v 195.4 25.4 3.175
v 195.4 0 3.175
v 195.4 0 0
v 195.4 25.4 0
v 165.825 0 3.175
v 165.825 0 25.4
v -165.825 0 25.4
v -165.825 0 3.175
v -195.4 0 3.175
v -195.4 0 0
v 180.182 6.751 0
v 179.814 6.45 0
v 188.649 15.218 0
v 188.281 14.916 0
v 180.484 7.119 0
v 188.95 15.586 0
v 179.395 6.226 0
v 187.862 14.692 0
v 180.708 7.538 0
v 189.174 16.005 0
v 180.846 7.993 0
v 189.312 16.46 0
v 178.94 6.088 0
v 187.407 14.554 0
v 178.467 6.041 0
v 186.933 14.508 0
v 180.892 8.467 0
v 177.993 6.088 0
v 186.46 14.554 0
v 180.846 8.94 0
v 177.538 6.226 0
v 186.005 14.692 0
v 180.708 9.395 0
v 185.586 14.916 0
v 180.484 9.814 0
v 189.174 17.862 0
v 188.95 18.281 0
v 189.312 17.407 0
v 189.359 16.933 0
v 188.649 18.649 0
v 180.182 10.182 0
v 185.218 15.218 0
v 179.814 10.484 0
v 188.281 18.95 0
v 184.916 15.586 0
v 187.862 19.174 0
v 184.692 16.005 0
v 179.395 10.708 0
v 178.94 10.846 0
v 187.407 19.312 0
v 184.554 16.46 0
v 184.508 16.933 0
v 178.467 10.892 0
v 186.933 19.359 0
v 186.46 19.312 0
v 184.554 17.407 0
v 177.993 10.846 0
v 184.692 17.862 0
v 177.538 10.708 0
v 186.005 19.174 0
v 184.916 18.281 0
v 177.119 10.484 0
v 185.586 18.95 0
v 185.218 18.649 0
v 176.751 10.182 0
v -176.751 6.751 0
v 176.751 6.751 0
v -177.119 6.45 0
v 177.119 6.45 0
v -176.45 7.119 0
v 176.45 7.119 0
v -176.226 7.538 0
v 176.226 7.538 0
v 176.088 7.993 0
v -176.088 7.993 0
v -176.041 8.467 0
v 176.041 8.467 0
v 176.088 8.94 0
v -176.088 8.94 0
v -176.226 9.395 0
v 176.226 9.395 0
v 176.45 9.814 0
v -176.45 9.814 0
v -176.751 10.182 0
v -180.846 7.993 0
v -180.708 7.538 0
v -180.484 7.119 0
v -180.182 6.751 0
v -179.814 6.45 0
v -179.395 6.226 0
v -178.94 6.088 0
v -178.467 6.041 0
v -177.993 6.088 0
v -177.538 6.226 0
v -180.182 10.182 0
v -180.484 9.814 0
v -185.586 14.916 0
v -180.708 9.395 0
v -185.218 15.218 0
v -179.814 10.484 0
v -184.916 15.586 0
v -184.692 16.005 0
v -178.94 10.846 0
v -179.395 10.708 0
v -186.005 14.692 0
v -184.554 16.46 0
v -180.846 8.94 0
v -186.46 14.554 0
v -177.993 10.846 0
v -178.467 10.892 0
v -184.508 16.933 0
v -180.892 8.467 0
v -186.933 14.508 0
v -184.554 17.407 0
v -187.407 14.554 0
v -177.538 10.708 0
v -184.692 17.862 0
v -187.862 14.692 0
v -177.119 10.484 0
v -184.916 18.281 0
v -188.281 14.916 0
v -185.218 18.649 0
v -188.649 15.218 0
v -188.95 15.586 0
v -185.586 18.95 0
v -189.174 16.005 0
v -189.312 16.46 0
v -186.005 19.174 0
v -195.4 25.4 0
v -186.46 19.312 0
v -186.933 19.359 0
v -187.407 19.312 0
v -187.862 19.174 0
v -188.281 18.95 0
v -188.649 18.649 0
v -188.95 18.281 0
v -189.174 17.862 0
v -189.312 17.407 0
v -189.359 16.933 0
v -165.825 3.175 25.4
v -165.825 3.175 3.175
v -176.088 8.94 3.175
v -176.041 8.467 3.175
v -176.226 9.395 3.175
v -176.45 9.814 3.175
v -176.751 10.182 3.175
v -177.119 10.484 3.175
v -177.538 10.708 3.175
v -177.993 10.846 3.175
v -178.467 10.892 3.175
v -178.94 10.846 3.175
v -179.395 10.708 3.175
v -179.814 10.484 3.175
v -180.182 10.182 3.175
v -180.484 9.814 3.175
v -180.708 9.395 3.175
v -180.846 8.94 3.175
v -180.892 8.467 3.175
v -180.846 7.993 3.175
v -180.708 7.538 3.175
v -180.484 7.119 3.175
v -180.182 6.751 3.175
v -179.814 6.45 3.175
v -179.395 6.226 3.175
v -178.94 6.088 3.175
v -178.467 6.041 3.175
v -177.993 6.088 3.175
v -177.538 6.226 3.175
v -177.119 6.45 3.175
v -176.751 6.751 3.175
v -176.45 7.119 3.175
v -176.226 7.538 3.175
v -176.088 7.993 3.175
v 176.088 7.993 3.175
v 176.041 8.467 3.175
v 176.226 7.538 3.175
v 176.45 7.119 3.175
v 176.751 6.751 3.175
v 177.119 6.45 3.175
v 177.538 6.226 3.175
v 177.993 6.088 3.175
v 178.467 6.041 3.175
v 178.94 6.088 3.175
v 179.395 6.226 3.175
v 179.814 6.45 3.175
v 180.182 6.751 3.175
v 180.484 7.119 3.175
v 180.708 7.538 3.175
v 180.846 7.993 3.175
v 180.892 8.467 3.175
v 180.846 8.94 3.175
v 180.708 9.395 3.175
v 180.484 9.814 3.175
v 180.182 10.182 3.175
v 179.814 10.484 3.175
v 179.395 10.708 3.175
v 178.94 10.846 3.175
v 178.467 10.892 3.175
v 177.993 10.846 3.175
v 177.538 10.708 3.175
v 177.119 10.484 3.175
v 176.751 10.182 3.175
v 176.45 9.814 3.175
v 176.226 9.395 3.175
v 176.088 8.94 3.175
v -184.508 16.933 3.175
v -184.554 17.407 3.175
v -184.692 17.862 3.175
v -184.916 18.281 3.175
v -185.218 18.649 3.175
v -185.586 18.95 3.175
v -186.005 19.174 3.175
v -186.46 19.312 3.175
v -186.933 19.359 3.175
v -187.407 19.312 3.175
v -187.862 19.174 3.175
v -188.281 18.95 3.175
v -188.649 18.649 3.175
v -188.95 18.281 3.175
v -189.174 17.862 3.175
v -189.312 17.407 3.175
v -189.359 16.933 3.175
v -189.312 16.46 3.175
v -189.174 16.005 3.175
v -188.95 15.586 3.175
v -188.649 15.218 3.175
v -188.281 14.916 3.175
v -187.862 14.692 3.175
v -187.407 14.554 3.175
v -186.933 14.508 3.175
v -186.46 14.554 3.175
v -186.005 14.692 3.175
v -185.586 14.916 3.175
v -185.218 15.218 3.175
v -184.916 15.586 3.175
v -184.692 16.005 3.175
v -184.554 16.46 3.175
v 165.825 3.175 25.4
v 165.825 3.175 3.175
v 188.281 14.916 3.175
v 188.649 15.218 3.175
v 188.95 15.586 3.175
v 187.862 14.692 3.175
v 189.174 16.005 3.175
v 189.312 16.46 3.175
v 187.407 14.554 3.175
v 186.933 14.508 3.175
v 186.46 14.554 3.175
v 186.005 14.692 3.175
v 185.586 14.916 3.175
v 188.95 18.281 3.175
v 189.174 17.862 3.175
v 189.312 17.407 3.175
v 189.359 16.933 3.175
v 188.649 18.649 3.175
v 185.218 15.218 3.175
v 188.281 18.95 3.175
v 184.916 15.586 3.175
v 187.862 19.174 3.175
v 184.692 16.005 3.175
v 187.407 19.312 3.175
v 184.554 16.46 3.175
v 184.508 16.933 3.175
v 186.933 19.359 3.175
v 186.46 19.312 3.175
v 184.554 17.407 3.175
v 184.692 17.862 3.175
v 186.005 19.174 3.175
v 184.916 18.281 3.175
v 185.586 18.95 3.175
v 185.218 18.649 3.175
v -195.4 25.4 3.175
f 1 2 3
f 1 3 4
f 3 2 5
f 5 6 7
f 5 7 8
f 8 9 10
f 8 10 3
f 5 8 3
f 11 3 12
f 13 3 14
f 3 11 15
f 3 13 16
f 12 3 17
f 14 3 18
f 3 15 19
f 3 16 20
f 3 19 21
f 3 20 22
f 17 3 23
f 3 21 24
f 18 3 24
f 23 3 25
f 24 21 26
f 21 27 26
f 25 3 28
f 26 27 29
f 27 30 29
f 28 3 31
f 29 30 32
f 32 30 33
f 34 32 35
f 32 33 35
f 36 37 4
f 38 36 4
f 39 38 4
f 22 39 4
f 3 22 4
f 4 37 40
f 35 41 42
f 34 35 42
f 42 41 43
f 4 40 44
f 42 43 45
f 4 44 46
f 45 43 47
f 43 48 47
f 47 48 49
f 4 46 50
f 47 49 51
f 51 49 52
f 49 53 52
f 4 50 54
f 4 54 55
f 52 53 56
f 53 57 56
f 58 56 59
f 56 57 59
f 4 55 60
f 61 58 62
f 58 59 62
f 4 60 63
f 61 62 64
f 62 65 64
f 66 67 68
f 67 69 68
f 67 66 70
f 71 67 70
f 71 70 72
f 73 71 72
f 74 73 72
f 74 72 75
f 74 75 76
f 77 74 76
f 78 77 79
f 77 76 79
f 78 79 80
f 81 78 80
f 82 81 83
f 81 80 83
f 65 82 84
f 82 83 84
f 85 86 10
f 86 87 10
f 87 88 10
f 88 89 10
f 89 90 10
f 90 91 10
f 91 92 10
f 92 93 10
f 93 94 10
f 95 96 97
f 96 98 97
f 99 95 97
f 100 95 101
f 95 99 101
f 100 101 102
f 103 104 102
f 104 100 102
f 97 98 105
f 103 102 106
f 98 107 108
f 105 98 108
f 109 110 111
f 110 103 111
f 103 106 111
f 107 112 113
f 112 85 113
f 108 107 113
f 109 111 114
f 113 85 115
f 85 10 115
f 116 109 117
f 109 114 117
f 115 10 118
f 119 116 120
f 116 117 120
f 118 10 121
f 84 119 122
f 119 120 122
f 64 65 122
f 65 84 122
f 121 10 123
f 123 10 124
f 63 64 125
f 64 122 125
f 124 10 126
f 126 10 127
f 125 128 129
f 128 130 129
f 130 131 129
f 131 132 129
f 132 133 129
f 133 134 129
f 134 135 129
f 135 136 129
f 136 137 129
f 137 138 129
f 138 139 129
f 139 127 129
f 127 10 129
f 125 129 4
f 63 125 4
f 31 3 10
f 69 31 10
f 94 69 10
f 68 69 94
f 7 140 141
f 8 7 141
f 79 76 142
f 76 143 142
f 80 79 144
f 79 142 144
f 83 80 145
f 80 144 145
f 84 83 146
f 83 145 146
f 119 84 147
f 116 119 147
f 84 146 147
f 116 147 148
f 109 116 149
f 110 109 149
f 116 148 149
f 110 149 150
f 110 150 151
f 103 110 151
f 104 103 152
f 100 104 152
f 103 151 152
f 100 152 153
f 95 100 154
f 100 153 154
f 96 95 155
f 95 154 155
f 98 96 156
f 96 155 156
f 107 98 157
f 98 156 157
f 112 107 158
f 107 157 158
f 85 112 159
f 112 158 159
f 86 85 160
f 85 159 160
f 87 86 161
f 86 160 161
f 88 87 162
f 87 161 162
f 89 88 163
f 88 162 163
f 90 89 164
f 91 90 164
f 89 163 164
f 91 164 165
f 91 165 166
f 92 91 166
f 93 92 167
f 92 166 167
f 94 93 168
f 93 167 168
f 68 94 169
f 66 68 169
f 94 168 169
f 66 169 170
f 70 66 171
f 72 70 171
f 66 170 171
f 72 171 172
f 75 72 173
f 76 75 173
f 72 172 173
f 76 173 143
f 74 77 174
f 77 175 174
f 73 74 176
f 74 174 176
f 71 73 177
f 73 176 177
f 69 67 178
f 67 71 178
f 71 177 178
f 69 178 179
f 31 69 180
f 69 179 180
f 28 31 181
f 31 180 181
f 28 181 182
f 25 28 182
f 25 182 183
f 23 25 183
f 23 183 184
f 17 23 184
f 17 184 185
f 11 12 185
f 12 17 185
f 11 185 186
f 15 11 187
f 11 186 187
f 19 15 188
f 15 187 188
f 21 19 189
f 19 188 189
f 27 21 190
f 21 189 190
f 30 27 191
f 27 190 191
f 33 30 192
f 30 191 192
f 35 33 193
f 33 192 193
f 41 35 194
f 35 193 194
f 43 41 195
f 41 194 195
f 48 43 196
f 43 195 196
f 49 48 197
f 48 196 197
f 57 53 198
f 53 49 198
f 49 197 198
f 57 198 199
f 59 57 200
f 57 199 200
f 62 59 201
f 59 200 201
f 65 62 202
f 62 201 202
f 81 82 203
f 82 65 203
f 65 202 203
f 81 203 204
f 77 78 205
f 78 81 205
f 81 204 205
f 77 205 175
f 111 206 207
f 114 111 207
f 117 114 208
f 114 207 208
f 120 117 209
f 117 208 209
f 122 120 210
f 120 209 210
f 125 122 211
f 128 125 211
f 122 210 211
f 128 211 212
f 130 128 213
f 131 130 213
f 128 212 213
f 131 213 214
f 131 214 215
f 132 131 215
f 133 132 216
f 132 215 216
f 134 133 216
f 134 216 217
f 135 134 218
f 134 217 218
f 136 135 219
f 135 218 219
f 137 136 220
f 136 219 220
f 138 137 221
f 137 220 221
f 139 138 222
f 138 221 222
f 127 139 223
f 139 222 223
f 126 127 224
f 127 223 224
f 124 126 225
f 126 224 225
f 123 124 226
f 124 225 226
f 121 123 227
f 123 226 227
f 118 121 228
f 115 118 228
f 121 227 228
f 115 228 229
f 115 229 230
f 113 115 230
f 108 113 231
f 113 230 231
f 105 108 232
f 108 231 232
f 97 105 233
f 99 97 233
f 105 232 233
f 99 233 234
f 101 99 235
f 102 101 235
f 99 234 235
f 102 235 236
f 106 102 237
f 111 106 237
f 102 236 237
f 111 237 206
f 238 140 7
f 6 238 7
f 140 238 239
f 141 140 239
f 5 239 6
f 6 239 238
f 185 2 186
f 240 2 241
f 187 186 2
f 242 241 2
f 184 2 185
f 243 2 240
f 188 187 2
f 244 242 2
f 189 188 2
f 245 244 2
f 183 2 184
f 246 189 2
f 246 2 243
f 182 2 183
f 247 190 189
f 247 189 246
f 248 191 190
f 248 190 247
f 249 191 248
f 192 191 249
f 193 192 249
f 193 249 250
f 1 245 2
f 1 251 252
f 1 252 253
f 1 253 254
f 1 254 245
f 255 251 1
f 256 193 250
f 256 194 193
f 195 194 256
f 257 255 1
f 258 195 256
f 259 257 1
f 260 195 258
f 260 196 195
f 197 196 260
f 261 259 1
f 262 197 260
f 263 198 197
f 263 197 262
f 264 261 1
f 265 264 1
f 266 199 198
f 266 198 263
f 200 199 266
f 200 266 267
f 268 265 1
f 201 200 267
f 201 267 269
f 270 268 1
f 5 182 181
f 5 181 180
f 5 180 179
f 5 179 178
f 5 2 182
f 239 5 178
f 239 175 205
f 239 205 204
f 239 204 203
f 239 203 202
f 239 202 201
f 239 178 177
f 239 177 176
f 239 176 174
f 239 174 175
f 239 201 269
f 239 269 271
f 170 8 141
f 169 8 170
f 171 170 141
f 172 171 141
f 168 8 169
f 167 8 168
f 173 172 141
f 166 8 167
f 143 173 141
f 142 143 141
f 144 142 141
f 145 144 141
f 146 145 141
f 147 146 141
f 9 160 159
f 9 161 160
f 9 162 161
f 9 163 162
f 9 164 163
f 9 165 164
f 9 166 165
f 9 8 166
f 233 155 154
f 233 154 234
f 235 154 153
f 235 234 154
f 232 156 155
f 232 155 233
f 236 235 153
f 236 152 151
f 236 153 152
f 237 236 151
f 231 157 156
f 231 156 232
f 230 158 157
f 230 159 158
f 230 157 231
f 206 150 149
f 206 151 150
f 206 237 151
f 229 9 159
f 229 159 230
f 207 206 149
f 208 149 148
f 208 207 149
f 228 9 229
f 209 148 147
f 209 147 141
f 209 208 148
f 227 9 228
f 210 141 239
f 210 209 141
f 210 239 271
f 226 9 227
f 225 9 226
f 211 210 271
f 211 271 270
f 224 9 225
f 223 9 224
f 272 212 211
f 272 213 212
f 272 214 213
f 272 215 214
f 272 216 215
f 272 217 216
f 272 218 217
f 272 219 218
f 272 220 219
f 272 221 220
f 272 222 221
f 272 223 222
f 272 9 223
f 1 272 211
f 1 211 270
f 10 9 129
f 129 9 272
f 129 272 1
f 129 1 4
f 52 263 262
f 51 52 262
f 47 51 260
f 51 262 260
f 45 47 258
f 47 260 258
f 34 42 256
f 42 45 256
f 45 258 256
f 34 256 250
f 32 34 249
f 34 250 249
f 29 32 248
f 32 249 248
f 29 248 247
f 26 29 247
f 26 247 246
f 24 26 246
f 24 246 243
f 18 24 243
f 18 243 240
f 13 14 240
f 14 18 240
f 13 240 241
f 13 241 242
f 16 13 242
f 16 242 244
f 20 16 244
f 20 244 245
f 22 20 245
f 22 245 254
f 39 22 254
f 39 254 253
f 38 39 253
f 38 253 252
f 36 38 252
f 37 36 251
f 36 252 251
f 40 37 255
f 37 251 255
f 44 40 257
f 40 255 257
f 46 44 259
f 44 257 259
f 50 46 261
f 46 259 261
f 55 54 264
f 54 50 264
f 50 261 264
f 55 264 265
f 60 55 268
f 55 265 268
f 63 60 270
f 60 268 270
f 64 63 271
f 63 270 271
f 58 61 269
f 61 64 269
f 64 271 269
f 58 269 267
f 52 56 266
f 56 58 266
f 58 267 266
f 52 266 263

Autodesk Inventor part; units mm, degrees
ref_plane "YZ Plane" through (0, 0, 0) normal (1, 0, 0) x (0, 1, 0)
ref_plane "XZ Plane" through (0, 0, 0) normal (0, 1, 0) x (-1, 0, 0)
ref_plane "XY Plane" through (0, 0, 0) normal (0, 0, 1) x (1, 0, 0)
sketch "Sketch1" plane through (0, 0, 0) normal (1, 0, 0) x (0, 1, 0)
  line L0 (25.4, 25.4) -> (0, 25.4) construction
  line L1 (0, 25.4) -> (0, 0)
  line L2 (0, 0) -> (25.4, 0)
  line L3 (25.4, 0) -> (25.4, 25.4) construction
  line L4 (25.4, 25.4) -> (3.175, 25.4) construction
  line L5 (3.175, 25.4) -> (3.175, 3.175)
  line L6 (3.175, 3.175) -> (25.4, 3.175)
  line L7 (25.4, 3.175) -> (25.4, 25.4) construction
  line L8 (25.4, 3.175) -> (25.4, 0)
  line L9 (3.175, 25.4) -> (0, 25.4)
  point P0 (0, 0)
  dimension "d1" = 25.4
  dimension "d2" = 3.175
extrude "Extrusion1" add sketch "Sketch1" along normal mid plane 390.8
sketch "Sketch2" plane through (-195.4, 3.175, 25.4) normal (0, 1, 0) x (1, 0, 0)
  line L0 (0, 0) -> (390.8, 0) projected
  line L1 (0, 0) -> (29.575, 0)
  line L2 (29.575, 0) -> (29.575, 22.225)
  line L3 (29.575, 22.225) -> (0, 22.225)
  line L4 (0, 22.225) -> (0, 0)
  line L5 (0, 22.225) -> (390.8, 22.225) projected
  point P0 (195.4, 25.4)
  point P1 (29.575, 0)
  dimension "d5" = 29.575
extrude "Extrusion2" cut sketch "Sketch2" against normal blind 3.175
sketch "Sketch3" plane through (-195.4, 25.4, 3.175) normal (0, 0, 1) x (1, 0, 0)
  line L0 (0, 0) -> (390.8, 0) construction
  line L1 (0, 0) -> (25.4, 0) construction
  line L2 (25.4, 0) -> (25.4, -25.4) construction
  line L3 (25.4, -25.4) -> (0, -25.4) construction
  line L4 (0, -25.4) -> (0, 0) construction
  line L5 (3.175, 0) -> (22.225, 0) construction
  line L6 (22.225, 0) -> (22.225, -25.4) construction
  line L7 (22.225, -25.4) -> (3.175, -25.4) construction
  line L8 (3.175, -25.4) -> (3.175, 0) construction
  line L9 (8.4667, -8.4667) -> (16.9333, -8.4667) construction
  line L10 (16.9333, -8.4667) -> (16.9333, -16.9333) construction
  line L11 (16.9333, -16.9333) -> (8.4667, -16.9333) construction
  line L12 (8.4667, -16.9333) -> (8.4667, -8.4667) construction
  circle A0 centre (8.4667, -8.4667) radius 2.4257
  circle A1 centre (16.9333, -16.9333) radius 2.4257
  point P0 (195.4, -25.4)
  point P1 (12.7, 0)
  point P2 (12.7, 0)
  point P3 (16.9333, -12.7)
  point P4 (22.225, -12.7)
  point P5 (12.7, -8.4667)
  dimension "d8" = 25.4
  dimension "d9" = 3.175
  dimension "d10" = 4.8514
  dimension "d11" = 8.4667
extrude "Extrusion3" cut sketch "Sketch3" against normal blind 3.175
mirror "Mirror1" about plane through (0, 0, 0) normal (1, 0, 0) of "Extrusion2", "Extrusion3"
properties part number "beamZ"
